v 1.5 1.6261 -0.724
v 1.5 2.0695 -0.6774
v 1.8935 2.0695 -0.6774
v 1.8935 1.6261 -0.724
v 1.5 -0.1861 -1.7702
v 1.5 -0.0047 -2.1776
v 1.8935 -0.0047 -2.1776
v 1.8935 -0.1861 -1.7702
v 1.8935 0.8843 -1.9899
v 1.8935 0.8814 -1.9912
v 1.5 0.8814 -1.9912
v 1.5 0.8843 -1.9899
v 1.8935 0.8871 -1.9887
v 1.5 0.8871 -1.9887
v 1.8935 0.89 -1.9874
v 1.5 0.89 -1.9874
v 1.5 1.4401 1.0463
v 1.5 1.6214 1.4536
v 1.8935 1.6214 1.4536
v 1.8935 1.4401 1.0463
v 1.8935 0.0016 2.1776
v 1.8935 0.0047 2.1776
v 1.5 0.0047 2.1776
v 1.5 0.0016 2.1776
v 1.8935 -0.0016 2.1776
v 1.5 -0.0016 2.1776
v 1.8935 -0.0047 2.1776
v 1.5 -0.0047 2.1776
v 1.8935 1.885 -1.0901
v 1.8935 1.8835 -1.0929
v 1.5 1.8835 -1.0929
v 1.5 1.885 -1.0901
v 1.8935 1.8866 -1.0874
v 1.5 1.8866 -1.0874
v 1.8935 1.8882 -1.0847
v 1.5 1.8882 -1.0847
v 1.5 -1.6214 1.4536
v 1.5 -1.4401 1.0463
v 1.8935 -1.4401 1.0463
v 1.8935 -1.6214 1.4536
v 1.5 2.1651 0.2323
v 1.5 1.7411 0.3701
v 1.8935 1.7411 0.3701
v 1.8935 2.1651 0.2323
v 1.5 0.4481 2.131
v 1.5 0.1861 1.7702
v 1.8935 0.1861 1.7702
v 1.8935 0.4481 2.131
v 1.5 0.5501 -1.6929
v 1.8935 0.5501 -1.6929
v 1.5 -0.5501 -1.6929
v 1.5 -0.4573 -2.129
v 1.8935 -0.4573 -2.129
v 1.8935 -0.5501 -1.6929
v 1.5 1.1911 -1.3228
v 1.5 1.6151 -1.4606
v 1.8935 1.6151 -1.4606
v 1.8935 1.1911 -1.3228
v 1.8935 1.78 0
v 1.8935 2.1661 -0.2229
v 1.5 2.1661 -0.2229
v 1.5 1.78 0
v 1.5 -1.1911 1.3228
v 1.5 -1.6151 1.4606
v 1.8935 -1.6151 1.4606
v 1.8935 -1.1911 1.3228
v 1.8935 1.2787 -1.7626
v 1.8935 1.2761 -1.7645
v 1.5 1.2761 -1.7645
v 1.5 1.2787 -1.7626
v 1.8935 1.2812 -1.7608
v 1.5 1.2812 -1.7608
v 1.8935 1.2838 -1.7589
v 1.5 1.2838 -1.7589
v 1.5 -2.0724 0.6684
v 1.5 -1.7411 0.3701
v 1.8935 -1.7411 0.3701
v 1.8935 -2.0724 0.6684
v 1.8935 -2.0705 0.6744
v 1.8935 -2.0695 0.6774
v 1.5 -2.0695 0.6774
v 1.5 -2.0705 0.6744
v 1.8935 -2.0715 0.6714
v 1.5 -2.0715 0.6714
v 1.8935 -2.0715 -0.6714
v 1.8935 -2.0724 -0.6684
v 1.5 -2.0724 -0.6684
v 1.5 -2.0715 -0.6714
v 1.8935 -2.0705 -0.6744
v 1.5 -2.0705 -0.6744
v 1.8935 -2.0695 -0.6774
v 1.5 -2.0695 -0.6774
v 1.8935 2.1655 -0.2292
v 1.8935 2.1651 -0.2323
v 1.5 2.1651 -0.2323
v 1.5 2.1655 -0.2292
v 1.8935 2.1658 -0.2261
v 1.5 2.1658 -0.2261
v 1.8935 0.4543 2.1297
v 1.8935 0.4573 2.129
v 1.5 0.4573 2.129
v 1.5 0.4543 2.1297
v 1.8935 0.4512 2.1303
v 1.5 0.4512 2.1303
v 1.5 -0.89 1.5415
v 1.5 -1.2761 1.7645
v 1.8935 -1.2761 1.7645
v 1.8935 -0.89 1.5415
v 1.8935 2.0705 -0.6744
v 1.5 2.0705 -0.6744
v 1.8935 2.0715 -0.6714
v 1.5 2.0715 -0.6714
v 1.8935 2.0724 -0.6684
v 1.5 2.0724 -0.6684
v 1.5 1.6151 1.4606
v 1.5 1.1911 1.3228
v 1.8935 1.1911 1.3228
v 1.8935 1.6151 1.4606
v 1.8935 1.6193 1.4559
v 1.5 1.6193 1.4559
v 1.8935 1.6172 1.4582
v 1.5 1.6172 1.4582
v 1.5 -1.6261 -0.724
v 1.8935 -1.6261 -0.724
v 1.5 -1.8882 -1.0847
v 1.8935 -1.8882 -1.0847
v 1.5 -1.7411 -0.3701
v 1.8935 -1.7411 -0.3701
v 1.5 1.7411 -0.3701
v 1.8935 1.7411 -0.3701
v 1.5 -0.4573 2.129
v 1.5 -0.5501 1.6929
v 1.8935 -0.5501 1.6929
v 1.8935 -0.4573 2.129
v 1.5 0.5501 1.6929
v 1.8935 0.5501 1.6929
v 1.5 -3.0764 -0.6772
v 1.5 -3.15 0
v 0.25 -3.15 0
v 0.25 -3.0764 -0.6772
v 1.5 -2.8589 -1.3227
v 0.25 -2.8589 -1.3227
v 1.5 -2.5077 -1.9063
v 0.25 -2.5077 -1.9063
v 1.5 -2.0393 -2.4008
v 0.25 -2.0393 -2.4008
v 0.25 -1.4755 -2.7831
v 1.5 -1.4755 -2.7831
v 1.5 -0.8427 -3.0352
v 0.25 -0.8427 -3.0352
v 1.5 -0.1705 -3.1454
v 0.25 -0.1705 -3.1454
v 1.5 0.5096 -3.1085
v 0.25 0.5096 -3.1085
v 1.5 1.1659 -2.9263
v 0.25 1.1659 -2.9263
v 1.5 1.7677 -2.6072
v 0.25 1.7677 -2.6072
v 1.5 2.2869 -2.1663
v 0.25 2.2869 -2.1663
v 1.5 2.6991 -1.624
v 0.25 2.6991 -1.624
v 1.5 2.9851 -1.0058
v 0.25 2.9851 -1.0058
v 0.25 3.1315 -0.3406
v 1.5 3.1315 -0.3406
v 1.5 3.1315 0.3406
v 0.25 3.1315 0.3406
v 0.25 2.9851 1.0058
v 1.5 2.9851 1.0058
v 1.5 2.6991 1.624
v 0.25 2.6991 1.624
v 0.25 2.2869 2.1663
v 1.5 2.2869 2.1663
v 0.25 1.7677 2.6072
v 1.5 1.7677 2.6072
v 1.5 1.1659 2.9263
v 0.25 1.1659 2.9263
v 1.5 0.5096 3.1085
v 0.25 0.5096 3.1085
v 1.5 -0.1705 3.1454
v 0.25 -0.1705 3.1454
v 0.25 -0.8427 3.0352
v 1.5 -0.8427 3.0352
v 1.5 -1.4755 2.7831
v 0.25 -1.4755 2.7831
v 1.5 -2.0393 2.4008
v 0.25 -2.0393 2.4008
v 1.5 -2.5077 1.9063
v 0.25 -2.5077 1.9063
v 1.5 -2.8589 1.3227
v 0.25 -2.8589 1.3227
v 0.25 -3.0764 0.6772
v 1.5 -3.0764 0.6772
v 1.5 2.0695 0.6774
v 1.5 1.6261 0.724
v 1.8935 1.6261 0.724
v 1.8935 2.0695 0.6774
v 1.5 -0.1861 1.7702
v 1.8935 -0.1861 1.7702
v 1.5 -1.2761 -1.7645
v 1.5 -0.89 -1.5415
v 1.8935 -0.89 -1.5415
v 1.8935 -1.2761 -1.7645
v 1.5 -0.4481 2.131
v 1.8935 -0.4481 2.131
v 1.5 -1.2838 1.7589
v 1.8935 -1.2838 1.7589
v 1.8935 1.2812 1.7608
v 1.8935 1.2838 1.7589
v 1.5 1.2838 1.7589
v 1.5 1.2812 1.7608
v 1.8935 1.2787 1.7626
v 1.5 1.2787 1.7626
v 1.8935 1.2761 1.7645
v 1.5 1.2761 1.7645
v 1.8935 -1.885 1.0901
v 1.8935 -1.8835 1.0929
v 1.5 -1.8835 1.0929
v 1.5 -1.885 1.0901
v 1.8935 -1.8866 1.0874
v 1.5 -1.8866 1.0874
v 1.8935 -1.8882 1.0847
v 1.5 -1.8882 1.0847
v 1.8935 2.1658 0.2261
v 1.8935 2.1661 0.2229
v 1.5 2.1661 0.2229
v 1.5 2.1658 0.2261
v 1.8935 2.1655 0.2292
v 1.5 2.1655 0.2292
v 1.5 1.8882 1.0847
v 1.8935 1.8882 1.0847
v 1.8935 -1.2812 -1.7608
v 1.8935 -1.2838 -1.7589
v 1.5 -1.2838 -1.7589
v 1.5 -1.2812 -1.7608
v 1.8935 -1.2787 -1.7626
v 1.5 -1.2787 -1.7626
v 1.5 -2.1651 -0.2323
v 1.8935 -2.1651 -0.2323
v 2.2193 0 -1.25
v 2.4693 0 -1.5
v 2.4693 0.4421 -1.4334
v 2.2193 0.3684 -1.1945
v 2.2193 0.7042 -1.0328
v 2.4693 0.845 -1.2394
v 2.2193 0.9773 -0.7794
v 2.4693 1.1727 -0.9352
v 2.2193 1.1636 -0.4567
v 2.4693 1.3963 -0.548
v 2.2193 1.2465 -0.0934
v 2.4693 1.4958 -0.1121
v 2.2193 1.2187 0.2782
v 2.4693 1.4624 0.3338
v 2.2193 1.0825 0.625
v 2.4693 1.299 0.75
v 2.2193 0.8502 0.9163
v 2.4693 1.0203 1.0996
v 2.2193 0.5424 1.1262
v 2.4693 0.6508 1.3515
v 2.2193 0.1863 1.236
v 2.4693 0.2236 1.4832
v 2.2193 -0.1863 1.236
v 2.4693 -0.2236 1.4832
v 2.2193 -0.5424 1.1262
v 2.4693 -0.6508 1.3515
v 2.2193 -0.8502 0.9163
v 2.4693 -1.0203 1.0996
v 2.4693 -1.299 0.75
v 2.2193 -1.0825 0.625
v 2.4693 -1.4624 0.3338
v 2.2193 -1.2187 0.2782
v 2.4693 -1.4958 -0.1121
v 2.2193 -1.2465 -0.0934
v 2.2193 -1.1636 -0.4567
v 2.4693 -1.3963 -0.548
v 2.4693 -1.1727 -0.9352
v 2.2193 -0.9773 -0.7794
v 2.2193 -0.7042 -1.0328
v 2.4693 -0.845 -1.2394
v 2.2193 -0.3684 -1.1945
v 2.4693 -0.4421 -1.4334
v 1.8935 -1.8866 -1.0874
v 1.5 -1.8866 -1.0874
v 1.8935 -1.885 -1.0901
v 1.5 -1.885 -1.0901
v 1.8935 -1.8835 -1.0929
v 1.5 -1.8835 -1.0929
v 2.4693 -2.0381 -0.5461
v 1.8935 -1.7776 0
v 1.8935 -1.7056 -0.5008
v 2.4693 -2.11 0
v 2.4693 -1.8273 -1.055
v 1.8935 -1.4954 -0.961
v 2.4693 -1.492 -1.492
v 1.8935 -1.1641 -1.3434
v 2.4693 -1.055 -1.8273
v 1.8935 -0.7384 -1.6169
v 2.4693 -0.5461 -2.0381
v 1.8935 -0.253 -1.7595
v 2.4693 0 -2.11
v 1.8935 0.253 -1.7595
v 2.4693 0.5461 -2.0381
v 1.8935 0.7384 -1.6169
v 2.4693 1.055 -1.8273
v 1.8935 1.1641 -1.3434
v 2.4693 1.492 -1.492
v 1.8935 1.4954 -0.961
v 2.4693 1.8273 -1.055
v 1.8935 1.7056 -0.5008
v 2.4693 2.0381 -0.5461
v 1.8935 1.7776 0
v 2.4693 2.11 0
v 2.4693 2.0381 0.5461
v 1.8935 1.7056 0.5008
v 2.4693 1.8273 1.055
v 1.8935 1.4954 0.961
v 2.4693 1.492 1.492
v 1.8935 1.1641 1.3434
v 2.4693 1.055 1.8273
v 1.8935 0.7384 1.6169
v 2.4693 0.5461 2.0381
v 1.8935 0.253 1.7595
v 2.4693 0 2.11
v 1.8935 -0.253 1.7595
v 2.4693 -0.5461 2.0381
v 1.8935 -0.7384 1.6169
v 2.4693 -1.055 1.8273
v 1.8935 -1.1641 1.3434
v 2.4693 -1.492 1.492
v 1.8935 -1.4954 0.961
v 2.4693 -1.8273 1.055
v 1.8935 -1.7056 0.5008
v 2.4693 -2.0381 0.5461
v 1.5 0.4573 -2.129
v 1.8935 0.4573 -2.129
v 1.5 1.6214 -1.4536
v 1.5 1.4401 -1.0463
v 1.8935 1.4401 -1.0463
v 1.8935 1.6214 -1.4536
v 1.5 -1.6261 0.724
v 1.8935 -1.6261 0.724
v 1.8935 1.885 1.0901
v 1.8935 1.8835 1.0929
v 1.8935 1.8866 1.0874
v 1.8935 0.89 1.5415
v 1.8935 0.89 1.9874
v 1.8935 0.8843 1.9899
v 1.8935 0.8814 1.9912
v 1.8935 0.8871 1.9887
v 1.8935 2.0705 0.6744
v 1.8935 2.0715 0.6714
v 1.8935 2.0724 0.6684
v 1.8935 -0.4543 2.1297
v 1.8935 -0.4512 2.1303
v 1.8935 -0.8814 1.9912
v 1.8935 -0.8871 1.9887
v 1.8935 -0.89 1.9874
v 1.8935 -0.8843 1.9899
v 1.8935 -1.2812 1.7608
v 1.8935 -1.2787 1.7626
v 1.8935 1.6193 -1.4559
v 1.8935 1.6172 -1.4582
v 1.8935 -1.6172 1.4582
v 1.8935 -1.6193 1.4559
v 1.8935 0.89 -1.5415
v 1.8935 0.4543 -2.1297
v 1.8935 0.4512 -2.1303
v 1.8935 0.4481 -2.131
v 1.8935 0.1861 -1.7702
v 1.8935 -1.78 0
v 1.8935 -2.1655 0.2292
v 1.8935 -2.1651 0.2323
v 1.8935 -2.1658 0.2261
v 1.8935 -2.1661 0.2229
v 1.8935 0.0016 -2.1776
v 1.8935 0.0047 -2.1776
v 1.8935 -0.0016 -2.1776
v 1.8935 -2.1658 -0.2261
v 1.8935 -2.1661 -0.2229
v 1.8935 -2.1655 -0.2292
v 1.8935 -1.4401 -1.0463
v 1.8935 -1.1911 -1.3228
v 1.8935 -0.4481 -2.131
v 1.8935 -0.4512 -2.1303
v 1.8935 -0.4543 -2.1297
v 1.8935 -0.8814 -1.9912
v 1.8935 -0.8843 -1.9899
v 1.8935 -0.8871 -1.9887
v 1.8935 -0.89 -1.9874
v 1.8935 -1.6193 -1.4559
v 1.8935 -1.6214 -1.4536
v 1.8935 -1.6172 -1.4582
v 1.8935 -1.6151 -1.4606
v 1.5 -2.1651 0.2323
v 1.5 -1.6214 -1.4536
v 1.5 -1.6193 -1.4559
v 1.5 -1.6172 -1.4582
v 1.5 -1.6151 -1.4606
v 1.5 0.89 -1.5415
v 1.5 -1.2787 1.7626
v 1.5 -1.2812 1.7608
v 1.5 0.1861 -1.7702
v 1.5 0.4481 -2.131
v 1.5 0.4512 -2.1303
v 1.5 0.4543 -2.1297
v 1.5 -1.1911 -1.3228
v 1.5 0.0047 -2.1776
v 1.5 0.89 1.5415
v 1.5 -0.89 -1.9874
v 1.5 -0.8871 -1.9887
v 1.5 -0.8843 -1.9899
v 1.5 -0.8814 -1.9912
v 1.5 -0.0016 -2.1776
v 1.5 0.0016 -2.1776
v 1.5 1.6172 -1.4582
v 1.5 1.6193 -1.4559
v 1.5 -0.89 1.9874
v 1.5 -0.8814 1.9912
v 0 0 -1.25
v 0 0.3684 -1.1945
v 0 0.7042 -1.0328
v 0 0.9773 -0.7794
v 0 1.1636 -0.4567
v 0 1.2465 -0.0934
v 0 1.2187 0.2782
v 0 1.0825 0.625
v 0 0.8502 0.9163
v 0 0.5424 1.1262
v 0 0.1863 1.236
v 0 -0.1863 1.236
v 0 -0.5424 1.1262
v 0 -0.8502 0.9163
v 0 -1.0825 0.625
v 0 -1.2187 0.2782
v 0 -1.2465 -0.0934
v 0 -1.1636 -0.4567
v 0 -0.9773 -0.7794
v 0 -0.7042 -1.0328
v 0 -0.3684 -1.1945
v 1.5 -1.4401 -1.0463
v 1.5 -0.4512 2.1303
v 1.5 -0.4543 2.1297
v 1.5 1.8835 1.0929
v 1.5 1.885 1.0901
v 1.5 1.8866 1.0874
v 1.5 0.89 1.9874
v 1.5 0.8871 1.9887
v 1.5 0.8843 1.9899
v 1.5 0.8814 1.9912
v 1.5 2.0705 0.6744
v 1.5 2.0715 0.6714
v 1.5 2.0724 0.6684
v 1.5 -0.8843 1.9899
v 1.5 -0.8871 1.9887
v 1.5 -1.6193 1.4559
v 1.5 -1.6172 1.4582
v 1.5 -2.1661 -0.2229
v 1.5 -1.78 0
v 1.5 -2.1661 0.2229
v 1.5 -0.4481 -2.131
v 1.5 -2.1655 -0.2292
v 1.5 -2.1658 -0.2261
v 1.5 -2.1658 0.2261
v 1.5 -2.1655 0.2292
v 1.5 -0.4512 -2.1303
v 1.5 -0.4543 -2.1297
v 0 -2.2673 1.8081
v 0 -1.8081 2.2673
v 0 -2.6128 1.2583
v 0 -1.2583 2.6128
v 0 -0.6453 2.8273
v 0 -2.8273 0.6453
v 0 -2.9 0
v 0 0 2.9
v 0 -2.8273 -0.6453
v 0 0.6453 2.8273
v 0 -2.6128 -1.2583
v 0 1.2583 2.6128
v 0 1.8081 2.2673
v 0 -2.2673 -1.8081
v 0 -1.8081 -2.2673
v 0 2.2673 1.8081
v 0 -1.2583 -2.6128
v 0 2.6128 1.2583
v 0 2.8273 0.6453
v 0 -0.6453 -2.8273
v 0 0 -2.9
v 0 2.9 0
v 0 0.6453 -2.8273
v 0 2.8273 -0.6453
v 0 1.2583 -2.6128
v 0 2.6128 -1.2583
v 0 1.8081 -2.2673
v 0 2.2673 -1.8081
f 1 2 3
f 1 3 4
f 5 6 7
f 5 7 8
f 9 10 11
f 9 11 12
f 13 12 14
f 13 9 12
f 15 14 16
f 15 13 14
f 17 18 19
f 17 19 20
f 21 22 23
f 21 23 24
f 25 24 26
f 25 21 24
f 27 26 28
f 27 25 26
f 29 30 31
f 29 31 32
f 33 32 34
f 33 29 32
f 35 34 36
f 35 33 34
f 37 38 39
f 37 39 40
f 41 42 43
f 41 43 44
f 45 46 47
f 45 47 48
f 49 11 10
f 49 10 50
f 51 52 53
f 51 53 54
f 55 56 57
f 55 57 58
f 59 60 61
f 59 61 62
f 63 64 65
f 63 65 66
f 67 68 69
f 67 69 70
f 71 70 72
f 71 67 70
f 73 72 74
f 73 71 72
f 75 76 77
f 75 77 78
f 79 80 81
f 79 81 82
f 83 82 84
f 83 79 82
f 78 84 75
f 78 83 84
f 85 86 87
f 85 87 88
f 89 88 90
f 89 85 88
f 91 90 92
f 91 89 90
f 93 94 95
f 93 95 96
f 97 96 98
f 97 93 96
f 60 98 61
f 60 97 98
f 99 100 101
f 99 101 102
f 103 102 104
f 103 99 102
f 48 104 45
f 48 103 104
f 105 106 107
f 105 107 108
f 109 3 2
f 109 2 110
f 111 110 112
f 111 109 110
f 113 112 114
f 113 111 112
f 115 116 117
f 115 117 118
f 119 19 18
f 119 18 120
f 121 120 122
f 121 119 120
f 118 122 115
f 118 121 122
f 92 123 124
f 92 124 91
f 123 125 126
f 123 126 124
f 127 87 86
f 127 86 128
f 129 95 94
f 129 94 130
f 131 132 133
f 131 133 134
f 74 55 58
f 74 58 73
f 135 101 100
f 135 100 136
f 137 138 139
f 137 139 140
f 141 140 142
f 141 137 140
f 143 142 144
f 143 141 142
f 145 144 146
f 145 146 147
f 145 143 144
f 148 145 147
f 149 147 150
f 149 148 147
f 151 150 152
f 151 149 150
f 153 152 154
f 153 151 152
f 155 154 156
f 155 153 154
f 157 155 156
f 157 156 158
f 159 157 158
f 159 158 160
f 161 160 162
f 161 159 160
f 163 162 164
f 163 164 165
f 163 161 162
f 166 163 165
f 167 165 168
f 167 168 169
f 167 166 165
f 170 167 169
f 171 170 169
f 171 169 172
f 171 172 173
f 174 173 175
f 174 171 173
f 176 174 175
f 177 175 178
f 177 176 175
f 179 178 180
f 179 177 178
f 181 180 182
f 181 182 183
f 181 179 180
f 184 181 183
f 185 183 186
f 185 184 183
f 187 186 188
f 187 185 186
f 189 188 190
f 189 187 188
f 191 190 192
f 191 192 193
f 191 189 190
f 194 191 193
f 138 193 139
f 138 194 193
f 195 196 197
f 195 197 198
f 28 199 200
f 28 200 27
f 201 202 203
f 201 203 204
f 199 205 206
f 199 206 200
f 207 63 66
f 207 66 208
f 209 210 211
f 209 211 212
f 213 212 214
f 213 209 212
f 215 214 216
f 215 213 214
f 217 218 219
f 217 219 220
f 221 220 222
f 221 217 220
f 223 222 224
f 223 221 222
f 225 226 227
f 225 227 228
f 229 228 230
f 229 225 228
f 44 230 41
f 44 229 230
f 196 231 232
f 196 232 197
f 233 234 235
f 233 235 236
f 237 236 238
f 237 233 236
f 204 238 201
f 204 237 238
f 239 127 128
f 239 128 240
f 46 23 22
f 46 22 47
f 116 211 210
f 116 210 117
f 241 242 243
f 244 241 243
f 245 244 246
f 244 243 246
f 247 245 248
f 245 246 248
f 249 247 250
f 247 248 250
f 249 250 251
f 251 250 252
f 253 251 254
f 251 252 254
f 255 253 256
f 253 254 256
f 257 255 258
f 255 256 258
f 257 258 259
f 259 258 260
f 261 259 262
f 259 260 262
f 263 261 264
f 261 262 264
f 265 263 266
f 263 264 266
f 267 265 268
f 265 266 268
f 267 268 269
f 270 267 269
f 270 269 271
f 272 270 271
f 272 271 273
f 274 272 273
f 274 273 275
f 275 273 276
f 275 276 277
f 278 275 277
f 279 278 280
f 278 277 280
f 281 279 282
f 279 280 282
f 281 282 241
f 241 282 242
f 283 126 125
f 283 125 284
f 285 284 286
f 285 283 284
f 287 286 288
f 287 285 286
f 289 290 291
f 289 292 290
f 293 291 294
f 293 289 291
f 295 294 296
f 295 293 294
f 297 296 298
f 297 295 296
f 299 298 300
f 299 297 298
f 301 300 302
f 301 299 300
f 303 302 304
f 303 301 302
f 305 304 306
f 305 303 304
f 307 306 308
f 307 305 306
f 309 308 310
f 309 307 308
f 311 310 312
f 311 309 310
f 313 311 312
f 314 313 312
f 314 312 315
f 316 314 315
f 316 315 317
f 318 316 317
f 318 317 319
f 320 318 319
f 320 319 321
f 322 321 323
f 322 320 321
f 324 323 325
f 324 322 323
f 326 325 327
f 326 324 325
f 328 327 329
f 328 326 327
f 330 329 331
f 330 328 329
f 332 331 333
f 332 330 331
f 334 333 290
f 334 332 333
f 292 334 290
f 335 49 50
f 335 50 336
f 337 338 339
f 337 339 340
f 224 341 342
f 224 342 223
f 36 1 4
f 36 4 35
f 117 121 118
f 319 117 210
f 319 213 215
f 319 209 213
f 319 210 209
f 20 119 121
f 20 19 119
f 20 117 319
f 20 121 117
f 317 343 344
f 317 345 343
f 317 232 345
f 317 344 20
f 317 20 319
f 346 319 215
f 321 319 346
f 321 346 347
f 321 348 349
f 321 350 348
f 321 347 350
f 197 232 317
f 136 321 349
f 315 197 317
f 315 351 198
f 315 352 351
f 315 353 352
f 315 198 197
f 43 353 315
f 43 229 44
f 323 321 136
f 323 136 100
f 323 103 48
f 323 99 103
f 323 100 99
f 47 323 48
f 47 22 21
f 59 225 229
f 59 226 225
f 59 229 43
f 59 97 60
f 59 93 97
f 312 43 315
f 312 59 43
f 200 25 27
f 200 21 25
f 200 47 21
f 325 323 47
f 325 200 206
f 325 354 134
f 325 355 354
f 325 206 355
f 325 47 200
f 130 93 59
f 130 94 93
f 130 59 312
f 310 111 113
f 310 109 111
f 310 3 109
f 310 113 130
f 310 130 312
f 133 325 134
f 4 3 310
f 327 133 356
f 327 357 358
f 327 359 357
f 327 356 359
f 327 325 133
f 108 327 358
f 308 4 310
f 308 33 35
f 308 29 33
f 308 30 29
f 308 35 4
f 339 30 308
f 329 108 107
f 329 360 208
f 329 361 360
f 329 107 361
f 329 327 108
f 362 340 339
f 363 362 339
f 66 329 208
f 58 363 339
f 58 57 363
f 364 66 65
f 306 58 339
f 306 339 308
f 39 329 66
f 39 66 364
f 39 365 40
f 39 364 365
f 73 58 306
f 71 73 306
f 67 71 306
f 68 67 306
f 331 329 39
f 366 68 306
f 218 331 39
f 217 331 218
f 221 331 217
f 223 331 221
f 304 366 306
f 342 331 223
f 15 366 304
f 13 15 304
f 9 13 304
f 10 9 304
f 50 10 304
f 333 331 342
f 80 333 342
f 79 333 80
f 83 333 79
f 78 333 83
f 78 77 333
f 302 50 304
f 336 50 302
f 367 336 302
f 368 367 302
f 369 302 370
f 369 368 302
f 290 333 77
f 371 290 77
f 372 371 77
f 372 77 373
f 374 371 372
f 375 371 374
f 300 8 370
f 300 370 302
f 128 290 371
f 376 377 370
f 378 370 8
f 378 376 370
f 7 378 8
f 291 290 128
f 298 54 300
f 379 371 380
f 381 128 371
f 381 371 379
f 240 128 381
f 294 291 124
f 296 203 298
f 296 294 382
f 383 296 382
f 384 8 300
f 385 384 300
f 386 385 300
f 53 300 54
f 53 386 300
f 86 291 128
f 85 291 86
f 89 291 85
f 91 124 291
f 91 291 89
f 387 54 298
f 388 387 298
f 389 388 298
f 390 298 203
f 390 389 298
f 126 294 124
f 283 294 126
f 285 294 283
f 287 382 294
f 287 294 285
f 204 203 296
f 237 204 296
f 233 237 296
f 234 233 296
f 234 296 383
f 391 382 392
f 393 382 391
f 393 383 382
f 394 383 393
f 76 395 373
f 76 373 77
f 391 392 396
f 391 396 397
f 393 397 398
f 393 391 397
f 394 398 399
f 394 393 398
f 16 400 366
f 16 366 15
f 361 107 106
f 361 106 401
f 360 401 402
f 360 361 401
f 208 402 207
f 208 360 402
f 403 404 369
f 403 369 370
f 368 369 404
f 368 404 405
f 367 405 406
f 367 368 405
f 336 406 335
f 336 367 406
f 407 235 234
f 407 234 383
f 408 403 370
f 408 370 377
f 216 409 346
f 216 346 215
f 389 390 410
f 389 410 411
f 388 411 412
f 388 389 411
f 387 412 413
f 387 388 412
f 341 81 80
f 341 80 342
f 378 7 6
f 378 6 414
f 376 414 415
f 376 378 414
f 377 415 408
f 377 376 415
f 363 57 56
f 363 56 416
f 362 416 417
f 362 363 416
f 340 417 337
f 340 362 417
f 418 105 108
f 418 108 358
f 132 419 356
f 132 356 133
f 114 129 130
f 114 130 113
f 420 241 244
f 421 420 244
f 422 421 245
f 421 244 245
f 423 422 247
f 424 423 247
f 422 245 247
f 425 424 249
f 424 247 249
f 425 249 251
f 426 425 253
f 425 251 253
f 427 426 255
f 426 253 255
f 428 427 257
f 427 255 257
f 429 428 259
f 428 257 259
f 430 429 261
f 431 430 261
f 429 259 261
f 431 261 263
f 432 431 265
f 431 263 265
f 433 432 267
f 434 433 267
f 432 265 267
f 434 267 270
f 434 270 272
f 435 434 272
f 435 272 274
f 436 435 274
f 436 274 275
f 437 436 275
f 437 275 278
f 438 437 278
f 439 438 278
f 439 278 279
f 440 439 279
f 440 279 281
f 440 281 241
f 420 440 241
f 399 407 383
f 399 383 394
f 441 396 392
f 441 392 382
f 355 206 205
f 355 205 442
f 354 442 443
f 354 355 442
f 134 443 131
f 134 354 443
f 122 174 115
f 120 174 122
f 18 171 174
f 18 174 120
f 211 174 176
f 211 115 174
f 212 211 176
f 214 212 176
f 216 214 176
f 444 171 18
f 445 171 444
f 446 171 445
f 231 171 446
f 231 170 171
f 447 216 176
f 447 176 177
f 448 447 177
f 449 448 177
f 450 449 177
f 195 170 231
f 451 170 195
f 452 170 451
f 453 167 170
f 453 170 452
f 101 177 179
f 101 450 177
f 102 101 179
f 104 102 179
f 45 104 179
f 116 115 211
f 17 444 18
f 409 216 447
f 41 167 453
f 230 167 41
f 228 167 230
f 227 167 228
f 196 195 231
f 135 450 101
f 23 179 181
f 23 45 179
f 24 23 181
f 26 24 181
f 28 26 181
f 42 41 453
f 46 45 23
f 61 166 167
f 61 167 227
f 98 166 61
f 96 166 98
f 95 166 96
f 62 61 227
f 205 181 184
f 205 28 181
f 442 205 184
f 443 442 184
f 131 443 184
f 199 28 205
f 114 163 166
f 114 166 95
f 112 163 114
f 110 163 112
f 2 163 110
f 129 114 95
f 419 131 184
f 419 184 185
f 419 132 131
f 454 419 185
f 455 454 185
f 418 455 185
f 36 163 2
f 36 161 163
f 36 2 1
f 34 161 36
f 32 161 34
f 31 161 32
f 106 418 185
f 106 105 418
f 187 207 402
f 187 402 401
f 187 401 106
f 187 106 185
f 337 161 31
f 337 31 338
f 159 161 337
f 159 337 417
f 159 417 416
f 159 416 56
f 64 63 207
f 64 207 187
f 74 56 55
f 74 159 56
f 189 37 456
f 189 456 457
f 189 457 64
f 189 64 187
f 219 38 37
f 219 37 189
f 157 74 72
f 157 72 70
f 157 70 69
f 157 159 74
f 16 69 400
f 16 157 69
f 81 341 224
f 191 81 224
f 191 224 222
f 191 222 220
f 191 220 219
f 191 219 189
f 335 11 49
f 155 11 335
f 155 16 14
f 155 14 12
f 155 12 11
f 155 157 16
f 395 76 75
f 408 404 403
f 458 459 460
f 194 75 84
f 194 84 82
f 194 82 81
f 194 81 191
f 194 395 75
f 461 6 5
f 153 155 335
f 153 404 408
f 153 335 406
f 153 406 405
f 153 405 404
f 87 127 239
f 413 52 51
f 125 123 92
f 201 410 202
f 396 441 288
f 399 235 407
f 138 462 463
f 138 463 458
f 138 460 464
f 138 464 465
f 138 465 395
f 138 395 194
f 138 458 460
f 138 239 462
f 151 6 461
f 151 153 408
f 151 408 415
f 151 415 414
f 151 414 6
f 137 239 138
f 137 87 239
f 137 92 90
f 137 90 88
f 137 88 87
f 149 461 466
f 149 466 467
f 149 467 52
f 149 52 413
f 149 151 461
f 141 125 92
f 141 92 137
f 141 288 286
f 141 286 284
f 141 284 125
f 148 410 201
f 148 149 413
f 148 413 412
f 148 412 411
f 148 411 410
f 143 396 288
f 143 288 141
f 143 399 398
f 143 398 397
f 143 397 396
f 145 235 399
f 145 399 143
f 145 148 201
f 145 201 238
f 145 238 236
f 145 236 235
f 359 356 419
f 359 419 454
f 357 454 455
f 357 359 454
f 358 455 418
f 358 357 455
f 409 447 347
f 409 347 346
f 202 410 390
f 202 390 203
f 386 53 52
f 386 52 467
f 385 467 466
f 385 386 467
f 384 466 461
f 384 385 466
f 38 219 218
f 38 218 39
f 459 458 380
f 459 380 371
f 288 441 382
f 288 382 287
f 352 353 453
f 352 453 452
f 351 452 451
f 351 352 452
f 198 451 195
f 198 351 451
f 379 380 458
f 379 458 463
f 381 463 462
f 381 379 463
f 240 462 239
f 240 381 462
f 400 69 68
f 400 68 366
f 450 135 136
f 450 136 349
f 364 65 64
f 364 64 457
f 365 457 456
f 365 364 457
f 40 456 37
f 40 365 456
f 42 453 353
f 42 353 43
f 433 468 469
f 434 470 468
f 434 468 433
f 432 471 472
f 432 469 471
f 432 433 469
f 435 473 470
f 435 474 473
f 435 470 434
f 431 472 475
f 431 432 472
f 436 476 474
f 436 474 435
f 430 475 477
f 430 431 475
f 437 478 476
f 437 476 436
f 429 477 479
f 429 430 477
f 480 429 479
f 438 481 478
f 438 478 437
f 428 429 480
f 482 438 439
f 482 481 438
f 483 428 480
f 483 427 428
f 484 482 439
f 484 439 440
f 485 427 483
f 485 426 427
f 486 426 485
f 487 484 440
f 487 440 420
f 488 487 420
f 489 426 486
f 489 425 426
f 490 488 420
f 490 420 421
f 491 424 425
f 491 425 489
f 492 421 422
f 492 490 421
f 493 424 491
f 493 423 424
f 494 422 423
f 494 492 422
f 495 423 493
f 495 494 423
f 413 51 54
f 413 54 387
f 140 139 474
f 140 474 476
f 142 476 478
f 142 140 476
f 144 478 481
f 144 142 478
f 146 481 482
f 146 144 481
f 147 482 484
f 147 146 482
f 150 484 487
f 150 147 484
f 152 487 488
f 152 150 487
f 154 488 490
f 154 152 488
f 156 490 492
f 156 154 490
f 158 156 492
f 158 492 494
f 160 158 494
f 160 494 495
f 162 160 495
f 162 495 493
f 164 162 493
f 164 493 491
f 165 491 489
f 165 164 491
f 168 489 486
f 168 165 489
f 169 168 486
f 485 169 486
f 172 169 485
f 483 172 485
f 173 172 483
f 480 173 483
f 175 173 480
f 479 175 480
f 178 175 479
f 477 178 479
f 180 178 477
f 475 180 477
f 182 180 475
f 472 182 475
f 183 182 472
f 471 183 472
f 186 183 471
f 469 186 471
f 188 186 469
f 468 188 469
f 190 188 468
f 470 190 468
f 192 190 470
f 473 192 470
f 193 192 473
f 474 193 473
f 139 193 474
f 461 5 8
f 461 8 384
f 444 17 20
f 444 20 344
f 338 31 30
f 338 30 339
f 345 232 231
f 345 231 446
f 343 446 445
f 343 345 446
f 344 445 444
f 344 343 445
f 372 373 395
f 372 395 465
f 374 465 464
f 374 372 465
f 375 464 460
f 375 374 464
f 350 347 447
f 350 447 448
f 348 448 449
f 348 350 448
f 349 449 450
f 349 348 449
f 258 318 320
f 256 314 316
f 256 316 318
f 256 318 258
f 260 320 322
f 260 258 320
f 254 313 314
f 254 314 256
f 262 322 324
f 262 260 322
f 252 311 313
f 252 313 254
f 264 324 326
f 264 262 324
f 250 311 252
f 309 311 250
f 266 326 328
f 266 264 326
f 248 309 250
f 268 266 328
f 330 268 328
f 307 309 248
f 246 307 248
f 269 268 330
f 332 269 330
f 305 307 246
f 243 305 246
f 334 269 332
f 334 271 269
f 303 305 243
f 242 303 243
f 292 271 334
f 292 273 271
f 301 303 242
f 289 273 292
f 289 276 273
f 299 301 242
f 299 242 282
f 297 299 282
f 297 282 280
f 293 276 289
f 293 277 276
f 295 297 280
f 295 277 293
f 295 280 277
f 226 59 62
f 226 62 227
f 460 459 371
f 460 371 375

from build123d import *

# Parameters (mm, degrees)
CUT_EXTRUDE_1_DEPTH      = 0.393521224
PATTERN_START            = 1.5
PATTERN_CIRCULAR_1_DEPTH = 0.393521224
HOLE_WIZARD_M31_D        = 2.5
HOLE_WIZARD_M31_DEPTH    = 8.5
HOLE_WIZARD_M31_TIP      = 0.751075774
CHAMFER_3_SIZE           = 0.25
CHAMFER_4_SIZE           = 0.25


# Read off the part's stored shape, not the designer's step: Круговой массив1
with BuildPart() as part:
    # Эскиз1 → Повернуть1 (revolve)
    with BuildSketch(Plane.XY, mode=Mode.PRIVATE) as revolve_1_sk:
        Polygon((0, 0), (0, 3.15), (1.5, 3.15), (1.5, 2.177572634), (1.893521224, 2.177572634), (1.893521224, 1.777572634), (2.469302313, 2.11), (2.469302313, 0), align=None)
    revolve(revolve_1_sk.sketch.rotate(Axis((0, 0, 0), (1, 0, 0)), 180), axis=Axis((0, 0, 0), (1, 0, 0)))

    # Эскиз2 → Вырез-Вытянуть1 (cut)
    with BuildSketch(Plane(origin=(1.893521224, 0, 0), x_dir=(0, 0, -1), z_dir=(1, 0, 0))):
        with BuildLine():
            Line((0, 1.78), (-0.222932839, 2.166131003))
            ThreePointArc((-0.222932839, 2.166131003), (0, 2.177572634), (0.222932839, 2.166131003))
            Line((0.222932839, 2.166131003), (0, 1.78))
        make_face()
    extrude(amount=-CUT_EXTRUDE_1_DEPTH, mode=Mode.SUBTRACT)

    # Круговой массив1 outline → Круговой массив1 (cut)
    with BuildSketch(Plane.YZ.offset(PATTERN_START)):
        with BuildLine():
            Line((-0.89, -1.987390896), (-0.89, -1.541525219))
            Line((-0.89, -1.541525219), (-1.276131004, -1.764458058))
            ThreePointArc((-1.276131004, -1.764458058), (-1.088786317, -1.885833219), (-0.89, -1.987390896))
        make_face()
        with BuildLine():
            Line((1.741102729, -0.37008281), (2.0724455, -0.668425181))
            ThreePointArc((2.0724455, -0.668425181), (2.129987447, -0.452742808), (2.165146187, -0.232302738))
            Line((2.165146187, -0.232302738), (1.741102729, -0.37008281))
        make_face()
        with BuildLine():
            Line((1.626110915, -0.723991225), (1.888184184, -1.084704135))
            ThreePointArc((1.888184184, -1.084704135), (1.989311588, -0.885698583), (2.069534093, -0.677385571))
            Line((2.069534093, -0.677385571), (1.626110915, -0.723991225))
        make_face()
        with BuildLine():
            Line((1.44005025, -1.046257749), (1.621400159, -1.453576313))
            ThreePointArc((1.621400159, -1.453576313), (1.761693267, -1.279945079), (1.883473429, -1.092863403))
            Line((1.883473429, -1.092863403), (1.44005025, -1.046257749))
        make_face()
        with BuildLine():
            Line((1.191052479, -1.322797789), (1.283753166, -1.758920232))
            ThreePointArc((1.283753166, -1.758920232), (1.457080496, -1.618251835), (1.615095937, -1.460577861))
            Line((1.615095937, -1.460577861), (1.191052479, -1.322797789))
        make_face()
        with BuildLine():
            Line((0.89, -1.541525219), (0.89, -1.987390896))
            ThreePointArc((0.89, -1.987390896), (1.088786317, -1.885833219), (1.276131003, -1.764458057))
            Line((1.276131003, -1.764458057), (0.89, -1.541525219))
        make_face()
        with BuildLine():
            Line((0.55005025, -1.692880599), (0.457349563, -2.129003042))
            ThreePointArc((0.457349563, -2.129003042), (0.67290695, -2.070994643), (0.881393021, -1.99122297))
            Line((0.881393021, -1.99122297), (0.55005025, -1.692880599))
        make_face()
        with BuildLine():
            Line((0.186060665, -1.770248974), (0.004710756, -2.177567538))
            ThreePointArc((0.004710756, -2.177567538), (0.227618321, -2.165643663), (0.448133934, -2.130961884))
            Line((0.448133934, -2.130961884), (0.186060665, -1.770248974))
        make_face()
        with BuildLine():
            Line((-0.186060665, -1.770248974), (-0.448133934, -2.130961884))
            ThreePointArc((-0.448133934, -2.130961884), (-0.227618321, -2.165643663), (-0.004710756, -2.177567538))
            Line((-0.004710756, -2.177567538), (-0.186060665, -1.770248974))
        make_face()
        with BuildLine():
            Line((-0.55005025, -1.692880599), (-0.881393021, -1.99122297))
            ThreePointArc((-0.881393021, -1.99122297), (-0.67290695, -2.070994643), (-0.457349563, -2.129003042))
            Line((-0.457349563, -2.129003042), (-0.55005025, -1.692880599))
        make_face()
        with BuildLine():
            ThreePointArc((2.165146187, 0.232302738), (2.129987447, 0.452742808), (2.0724455, 0.668425181))
            Line((2.0724455, 0.668425181), (1.741102729, 0.37008281))
            Line((1.741102729, 0.37008281), (2.165146187, 0.232302738))
        make_face()
        with BuildLine():
            ThreePointArc((2.069534093, 0.677385571), (1.989311588, 0.885698583), (1.888184184, 1.084704135))
            Line((1.888184184, 1.084704135), (1.626110915, 0.723991225))
            Line((1.626110915, 0.723991225), (2.069534093, 0.677385571))
        make_face()
        with BuildLine():
            ThreePointArc((1.883473429, 1.092863403), (1.761693267, 1.279945079), (1.621400159, 1.453576313))
            Line((1.621400159, 1.453576313), (1.44005025, 1.046257749))
            Line((1.44005025, 1.046257749), (1.883473429, 1.092863403))
        make_face()
        with BuildLine():
            ThreePointArc((1.615095937, 1.460577861), (1.457080496, 1.618251835), (1.283753166, 1.758920232))
            Line((1.283753166, 1.758920232), (1.191052479, 1.322797789))
            Line((1.191052479, 1.322797789), (1.615095937, 1.460577861))
        make_face()
        with BuildLine():
            ThreePointArc((1.276131003, 1.764458057), (1.088786317, 1.885833219), (0.89, 1.987390896))
            Line((0.89, 1.987390896), (0.89, 1.541525219))
            Line((0.89, 1.541525219), (1.276131003, 1.764458057))
        make_face()
        with BuildLine():
            ThreePointArc((0.881393021, 1.99122297), (0.67290695, 2.070994643), (0.457349563, 2.129003042))
            Line((0.457349563, 2.129003042), (0.55005025, 1.692880599))
            Line((0.55005025, 1.692880599), (0.881393021, 1.99122297))
        make_face()
        with BuildLine():
            ThreePointArc((0.448133934, 2.130961884), (0.227618321, 2.165643663), (0.004710756, 2.177567538))
            Line((0.004710756, 2.177567538), (0.186060665, 1.770248974))
            Line((0.186060665, 1.770248974), (0.448133934, 2.130961884))
        make_face()
        with BuildLine():
            ThreePointArc((-0.004710756, 2.177567538), (-0.227618321, 2.165643663), (-0.448133934, 2.130961884))
            Line((-0.448133934, 2.130961884), (-0.186060665, 1.770248974))
            Line((-0.186060665, 1.770248974), (-0.004710756, 2.177567538))
        make_face()
        with BuildLine():
            ThreePointArc((-0.457349563, 2.129003042), (-0.67290695, 2.070994643), (-0.881393021, 1.99122297))
            Line((-0.881393021, 1.99122297), (-0.55005025, 1.692880599))
            Line((-0.55005025, 1.692880599), (-0.457349563, 2.129003042))
        make_face()
        with BuildLine():
            ThreePointArc((-0.89, 1.987390896), (-1.088786317, 1.885833219), (-1.276131004, 1.764458058))
            Line((-1.276131004, 1.764458058), (-0.89, 1.541525219))
            Line((-0.89, 1.541525219), (-0.89, 1.987390896))
        make_face()
        with BuildLine():
            ThreePointArc((-1.283753166, 1.758920232), (-1.457080497, 1.618251835), (-1.615095937, 1.460577861))
            Line((-1.615095937, 1.460577861), (-1.191052479, 1.322797789))
            Line((-1.191052479, 1.322797789), (-1.283753166, 1.758920232))
        make_face()
        with BuildLine():
            ThreePointArc((-1.621400159, 1.453576313), (-1.761693268, 1.27994508), (-1.883473429, 1.092863403))
            Line((-1.883473429, 1.092863403), (-1.44005025, 1.046257749))
            Line((-1.44005025, 1.046257749), (-1.621400159, 1.453576313))
        make_face()
        with BuildLine():
            ThreePointArc((-1.888184185, 1.084704135), (-1.989311588, 0.885698583), (-2.069534094, 0.677385571))
            Line((-2.069534094, 0.677385571), (-1.626110915, 0.723991225))
            Line((-1.626110915, 0.723991225), (-1.888184185, 1.084704135))
        make_face()
        with BuildLine():
            ThreePointArc((-2.072445501, 0.668425181), (-2.129987447, 0.452742808), (-2.165146188, 0.232302738))
            Line((-2.165146188, 0.232302738), (-1.741102729, 0.37008281))
            Line((-1.741102729, 0.37008281), (-2.072445501, 0.668425181))
        make_face()
        with BuildLine():
            ThreePointArc((-2.166131004, 0.222932839), (-2.177572634, 0), (-2.166131004, -0.222932839))
            Line((-2.166131004, -0.222932839), (-1.78, 0))
            Line((-1.78, 0), (-2.166131004, 0.222932839))
        make_face()
        with BuildLine():
            ThreePointArc((-2.165146188, -0.232302738), (-2.129987447, -0.452742808), (-2.072445501, -0.668425181))
            Line((-2.072445501, -0.668425181), (-1.741102729, -0.37008281))
            Line((-1.741102729, -0.37008281), (-2.165146188, -0.232302738))
        make_face()
        with BuildLine():
            ThreePointArc((-2.069534094, -0.677385571), (-1.989311588, -0.885698583), (-1.888184185, -1.084704135))
            Line((-1.888184185, -1.084704135), (-1.626110915, -0.723991225))
            Line((-1.626110915, -0.723991225), (-2.069534094, -0.677385571))
        make_face()
        with BuildLine():
            ThreePointArc((-1.883473429, -1.092863403), (-1.761693268, -1.27994508), (-1.621400159, -1.453576313))
            Line((-1.621400159, -1.453576313), (-1.44005025, -1.046257749))
            Line((-1.44005025, -1.046257749), (-1.883473429, -1.092863403))
        make_face()
        with BuildLine():
            ThreePointArc((-1.615095937, -1.460577861), (-1.457080497, -1.618251835), (-1.283753166, -1.758920232))
            Line((-1.283753166, -1.758920232), (-1.191052479, -1.322797789))
            Line((-1.191052479, -1.322797789), (-1.615095937, -1.460577861))
        make_face()
    extrude(amount=PATTERN_CIRCULAR_1_DEPTH, mode=Mode.SUBTRACT)

    # Отверстие обработанное метчиком M31
    with Locations(Plane.ZY):
        with Locations((0, 0)):
            Hole(HOLE_WIZARD_M31_D / 2, depth=HOLE_WIZARD_M31_DEPTH)
            with Locations((0, 0, -(HOLE_WIZARD_M31_DEPTH + HOLE_WIZARD_M31_TIP / 2))):  # 118° drill point
                Cone(0, HOLE_WIZARD_M31_D / 2, HOLE_WIZARD_M31_TIP, mode=Mode.SUBTRACT)

    # Фаска3
    chamfer_3_edges = [part.edges().sort_by_distance(p)[0] for p in [
        (2.469302313, 0, 1.25),
    ]]
    chamfer(chamfer_3_edges, length=CHAMFER_3_SIZE)

    # Фаска4
    chamfer_4_edges = [part.edges().sort_by_distance(p)[0] for p in [
        (0, 3.15, 0),
    ]]
    chamfer(chamfer_4_edges, length=CHAMFER_4_SIZE)


solid = part.part
